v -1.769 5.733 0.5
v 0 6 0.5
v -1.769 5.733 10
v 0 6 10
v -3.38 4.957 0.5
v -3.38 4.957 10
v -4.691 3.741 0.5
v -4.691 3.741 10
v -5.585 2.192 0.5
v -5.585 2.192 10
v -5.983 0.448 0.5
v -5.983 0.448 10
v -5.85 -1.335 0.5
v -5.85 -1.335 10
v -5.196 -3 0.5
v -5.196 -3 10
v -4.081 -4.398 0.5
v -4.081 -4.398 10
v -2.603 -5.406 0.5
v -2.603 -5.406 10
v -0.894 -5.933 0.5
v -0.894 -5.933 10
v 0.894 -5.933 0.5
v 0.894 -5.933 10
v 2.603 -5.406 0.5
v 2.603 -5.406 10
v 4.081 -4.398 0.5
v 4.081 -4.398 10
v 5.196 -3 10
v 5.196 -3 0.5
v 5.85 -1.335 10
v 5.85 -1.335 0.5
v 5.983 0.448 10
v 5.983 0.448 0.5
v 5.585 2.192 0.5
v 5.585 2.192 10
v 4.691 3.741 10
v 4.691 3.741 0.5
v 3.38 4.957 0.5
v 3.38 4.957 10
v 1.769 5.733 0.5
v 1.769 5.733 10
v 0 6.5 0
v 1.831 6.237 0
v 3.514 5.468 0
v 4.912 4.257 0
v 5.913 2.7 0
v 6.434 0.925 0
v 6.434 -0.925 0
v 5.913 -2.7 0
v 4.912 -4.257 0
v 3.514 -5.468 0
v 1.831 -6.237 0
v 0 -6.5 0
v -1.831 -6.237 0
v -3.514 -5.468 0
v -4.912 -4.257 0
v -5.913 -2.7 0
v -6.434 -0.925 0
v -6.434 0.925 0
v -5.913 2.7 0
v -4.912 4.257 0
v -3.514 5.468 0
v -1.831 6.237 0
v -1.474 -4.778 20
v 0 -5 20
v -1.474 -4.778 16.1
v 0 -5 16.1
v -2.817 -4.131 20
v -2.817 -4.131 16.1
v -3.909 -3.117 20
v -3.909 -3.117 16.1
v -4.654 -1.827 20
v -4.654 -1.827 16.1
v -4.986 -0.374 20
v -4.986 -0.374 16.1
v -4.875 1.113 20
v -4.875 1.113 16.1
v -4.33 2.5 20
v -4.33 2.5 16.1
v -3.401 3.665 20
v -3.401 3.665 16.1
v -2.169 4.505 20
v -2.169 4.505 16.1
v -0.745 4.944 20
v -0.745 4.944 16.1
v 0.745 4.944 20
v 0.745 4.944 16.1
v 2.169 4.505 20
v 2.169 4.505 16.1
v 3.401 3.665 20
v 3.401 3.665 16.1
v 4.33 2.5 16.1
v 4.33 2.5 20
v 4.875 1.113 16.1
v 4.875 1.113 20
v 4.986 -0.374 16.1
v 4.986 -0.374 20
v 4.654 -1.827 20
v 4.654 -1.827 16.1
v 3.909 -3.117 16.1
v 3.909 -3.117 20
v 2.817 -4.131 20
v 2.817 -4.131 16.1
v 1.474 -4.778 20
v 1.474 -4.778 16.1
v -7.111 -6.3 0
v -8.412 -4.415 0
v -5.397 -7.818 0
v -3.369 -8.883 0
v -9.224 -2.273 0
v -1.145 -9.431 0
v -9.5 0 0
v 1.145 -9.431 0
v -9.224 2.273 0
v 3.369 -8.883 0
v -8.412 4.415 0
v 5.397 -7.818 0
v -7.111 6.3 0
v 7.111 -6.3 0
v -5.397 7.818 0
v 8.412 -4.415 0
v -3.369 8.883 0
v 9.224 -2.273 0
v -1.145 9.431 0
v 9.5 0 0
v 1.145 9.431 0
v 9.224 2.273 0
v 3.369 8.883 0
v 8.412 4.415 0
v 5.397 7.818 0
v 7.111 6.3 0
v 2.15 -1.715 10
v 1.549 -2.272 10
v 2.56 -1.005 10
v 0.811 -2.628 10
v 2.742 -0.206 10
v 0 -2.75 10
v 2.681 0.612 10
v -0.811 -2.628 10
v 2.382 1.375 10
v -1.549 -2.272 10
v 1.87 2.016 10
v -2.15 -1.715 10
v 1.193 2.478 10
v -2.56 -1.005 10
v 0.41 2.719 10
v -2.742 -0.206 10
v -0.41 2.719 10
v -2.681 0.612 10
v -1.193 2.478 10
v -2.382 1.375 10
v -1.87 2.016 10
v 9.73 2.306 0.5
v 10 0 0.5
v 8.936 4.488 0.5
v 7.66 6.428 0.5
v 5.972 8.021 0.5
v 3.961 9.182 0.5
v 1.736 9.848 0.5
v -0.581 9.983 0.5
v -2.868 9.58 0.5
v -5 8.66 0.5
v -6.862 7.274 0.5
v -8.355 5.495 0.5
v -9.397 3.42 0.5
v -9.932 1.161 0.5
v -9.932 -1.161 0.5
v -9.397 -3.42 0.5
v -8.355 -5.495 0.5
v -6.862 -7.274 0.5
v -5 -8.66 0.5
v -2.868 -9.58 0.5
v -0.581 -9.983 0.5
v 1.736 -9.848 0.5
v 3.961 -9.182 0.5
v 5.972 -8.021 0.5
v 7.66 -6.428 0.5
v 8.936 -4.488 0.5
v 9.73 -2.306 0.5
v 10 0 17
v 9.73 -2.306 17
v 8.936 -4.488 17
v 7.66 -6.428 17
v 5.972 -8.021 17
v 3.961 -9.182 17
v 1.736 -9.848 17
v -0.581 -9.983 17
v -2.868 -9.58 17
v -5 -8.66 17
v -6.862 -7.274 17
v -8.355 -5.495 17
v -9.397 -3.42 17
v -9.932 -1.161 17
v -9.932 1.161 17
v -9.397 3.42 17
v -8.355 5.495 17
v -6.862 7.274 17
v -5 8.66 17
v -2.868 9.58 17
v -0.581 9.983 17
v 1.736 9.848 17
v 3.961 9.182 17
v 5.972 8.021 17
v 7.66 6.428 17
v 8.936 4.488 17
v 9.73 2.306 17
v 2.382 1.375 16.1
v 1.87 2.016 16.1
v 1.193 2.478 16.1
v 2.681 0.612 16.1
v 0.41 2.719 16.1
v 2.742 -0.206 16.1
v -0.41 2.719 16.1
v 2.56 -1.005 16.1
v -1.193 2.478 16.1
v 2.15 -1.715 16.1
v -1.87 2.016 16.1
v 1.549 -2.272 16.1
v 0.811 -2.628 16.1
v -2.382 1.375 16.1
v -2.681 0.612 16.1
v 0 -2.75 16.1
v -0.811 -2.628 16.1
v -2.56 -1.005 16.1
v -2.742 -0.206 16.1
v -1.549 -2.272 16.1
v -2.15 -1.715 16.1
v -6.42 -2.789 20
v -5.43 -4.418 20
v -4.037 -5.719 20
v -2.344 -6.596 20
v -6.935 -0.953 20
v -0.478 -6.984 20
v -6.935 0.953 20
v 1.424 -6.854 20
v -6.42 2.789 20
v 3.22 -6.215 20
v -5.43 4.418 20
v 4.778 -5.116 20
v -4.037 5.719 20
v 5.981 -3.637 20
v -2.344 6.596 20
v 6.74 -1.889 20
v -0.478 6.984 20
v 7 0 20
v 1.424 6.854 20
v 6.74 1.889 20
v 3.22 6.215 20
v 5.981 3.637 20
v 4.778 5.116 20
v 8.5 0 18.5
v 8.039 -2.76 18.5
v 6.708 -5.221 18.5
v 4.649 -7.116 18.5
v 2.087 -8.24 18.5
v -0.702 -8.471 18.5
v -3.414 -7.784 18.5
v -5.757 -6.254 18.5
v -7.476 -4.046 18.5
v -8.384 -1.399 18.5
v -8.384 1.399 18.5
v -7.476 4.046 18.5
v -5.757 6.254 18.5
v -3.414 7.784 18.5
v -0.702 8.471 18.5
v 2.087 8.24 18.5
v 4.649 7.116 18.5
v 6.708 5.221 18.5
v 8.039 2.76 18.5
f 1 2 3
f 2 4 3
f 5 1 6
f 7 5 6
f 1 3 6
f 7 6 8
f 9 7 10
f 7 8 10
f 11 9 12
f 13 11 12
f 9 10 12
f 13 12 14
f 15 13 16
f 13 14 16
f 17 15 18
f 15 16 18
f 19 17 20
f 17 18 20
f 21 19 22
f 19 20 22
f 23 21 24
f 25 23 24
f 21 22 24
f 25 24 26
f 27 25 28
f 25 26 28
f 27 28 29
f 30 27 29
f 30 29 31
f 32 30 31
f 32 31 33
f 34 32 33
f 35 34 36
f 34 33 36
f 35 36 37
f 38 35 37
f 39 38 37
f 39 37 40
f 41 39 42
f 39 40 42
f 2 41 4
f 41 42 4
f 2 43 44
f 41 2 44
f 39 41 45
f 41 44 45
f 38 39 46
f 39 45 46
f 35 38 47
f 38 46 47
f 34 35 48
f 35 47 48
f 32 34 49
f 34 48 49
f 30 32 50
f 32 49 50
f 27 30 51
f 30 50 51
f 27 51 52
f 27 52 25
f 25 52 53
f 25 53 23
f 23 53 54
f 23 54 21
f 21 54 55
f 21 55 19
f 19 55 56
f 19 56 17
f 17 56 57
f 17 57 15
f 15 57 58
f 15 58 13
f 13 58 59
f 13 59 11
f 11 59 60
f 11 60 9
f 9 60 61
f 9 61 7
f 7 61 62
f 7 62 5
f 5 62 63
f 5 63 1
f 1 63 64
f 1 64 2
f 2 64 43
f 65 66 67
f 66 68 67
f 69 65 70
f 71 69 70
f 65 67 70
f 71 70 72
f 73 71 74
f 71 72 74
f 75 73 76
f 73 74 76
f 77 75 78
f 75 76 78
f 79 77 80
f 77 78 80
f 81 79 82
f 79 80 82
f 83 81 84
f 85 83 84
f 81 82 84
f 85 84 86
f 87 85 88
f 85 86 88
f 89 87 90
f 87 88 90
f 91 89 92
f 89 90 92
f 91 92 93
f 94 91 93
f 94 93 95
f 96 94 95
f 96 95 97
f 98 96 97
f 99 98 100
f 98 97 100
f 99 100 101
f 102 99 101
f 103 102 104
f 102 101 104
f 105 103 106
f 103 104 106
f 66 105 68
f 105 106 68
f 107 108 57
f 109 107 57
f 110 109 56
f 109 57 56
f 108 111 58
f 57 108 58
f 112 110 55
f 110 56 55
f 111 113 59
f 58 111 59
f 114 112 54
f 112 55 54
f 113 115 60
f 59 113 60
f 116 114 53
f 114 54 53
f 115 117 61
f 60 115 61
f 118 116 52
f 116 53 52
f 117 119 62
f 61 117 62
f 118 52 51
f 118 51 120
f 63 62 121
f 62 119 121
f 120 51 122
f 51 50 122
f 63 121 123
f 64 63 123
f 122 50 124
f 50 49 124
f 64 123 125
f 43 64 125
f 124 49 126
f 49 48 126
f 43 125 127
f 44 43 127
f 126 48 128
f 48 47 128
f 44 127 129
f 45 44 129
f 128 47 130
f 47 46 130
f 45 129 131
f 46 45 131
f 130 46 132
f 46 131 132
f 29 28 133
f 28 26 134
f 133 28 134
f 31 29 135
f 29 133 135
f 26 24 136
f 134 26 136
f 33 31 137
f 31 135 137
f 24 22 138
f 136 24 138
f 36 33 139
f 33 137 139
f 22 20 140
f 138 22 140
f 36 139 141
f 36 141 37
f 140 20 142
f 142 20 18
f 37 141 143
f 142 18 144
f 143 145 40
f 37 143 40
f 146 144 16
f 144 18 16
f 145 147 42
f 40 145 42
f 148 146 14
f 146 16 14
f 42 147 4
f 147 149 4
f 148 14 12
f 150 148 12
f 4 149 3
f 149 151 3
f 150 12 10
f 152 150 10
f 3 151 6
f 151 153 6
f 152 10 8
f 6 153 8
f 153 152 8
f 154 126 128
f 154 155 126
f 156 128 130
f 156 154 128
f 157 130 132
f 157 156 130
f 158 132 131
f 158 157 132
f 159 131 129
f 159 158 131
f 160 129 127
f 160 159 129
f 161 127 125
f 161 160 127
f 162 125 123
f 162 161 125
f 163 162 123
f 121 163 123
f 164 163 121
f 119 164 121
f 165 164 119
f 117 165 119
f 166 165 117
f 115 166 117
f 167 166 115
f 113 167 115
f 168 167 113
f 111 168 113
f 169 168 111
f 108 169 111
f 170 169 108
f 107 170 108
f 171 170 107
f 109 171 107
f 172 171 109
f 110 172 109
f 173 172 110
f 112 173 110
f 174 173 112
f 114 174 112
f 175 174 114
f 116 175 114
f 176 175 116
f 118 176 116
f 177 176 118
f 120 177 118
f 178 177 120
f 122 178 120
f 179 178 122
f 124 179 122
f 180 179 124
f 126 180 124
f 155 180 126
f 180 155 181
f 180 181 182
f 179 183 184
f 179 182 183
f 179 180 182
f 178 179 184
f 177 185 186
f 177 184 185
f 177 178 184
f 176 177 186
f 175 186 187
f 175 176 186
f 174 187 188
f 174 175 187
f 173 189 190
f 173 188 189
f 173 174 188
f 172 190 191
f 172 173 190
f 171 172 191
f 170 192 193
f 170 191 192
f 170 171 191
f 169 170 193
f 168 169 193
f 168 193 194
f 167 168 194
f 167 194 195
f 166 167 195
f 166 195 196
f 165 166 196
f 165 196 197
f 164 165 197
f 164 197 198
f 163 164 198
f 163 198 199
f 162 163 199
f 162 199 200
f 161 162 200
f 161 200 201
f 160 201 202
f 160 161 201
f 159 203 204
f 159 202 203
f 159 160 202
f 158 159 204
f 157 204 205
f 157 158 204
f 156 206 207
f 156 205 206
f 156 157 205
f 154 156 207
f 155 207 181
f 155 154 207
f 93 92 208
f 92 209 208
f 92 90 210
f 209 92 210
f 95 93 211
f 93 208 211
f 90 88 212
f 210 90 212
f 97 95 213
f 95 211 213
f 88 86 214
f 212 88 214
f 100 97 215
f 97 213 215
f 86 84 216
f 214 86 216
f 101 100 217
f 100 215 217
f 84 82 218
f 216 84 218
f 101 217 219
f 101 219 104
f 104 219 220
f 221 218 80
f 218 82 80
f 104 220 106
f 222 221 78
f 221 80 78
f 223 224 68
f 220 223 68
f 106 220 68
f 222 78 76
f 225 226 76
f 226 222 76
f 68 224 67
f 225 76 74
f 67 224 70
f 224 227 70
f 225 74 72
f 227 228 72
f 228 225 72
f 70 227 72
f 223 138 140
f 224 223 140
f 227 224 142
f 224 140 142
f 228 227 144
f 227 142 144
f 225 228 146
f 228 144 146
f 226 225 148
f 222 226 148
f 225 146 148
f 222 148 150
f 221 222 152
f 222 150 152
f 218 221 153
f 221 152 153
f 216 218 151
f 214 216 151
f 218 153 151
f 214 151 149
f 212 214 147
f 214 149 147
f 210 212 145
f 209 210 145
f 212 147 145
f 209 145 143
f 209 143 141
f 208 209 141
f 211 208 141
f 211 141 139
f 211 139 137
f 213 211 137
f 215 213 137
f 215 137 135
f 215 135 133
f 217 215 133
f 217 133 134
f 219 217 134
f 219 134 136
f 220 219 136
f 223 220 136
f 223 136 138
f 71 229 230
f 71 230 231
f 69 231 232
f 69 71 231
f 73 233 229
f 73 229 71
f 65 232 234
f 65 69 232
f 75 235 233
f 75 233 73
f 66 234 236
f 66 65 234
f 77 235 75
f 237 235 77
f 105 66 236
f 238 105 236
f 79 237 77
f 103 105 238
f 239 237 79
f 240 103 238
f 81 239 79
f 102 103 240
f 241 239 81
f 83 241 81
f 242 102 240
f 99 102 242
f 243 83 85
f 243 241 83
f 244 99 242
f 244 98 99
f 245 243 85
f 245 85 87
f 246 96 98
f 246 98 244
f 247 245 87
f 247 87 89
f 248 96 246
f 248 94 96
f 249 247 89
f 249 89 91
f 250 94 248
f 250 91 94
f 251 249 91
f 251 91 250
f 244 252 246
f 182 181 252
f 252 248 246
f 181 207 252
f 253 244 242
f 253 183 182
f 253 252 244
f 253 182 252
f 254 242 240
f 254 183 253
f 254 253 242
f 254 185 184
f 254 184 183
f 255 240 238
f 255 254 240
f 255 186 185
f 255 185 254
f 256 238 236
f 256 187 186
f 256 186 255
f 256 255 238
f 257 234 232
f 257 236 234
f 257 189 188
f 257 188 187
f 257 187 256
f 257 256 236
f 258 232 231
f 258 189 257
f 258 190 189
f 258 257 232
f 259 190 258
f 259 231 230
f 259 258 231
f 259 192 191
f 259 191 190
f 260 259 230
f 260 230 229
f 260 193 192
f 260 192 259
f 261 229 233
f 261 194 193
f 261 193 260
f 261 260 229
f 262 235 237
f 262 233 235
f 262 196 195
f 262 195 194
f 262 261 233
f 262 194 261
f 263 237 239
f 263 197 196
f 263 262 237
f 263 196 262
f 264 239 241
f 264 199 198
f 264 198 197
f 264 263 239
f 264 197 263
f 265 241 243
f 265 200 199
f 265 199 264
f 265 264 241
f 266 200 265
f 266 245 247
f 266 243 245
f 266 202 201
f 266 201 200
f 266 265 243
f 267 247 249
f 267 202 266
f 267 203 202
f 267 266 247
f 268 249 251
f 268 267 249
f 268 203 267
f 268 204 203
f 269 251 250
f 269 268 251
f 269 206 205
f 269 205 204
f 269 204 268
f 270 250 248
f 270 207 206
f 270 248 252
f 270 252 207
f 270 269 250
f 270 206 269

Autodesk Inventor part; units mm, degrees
ref_plane "YZ Plane" through (0, 0, 0) normal (1, 0, 0) x (0, 1, 0)
ref_plane "XZ Plane" through (0, 0, 0) normal (0, 1, 0) x (-1, 0, 0)
ref_plane "XY Plane" through (0, 0, 0) normal (0, 0, 1) x (1, 0, 0)
sketch "Skizze2" plane through (0, 0, 0) normal (0, 0, 1) x (1, 0, 0)
  line L0 (0, 14) -> (0, -14) construction
  line L1 (-14, 0) -> (14, 0) construction
  circle A0 centre (0, 0) radius 10
  dimension "d0" = 20
extrude "Grundkörper" add sketch "Skizze2" along normal blind 20
sketch "Skizze3" plane through (0, 0, 0) normal (0, 0, -1) x (-1, 0, 0)
  line L0 (0, -14) -> (0, 14) projected
  line L1 (-14, 0) -> (14, 0) projected
  point P0 (0, 0)
  point P1 (0, 0)
hole "12H7_Passbohrung" at (0, 0, 0) direction (0, 0, 1) diameter 12 depth 10
sketch "Skizze4" plane through (0, 0, 20) normal (0, 0, 1) x (1, 0, 0)
  line L0 (0, 14) -> (0, -14) construction
  line L1 (-14, 0) -> (14, 0) construction
  point P0 (0, 0)
  point P1 (0, 0)
hole "DIN7984_M5_Bohrung" at (0, 0, 20) direction (0, 0, -1) diameter 5.5 end through all counterbore diameter 10 counterbore depth 3.9
chamfer "Fase_Deckel" distance 3 angle 45 1 edges at (-10, 0, 20)
chamfer "Fase_Allgemein" distance 0.5 angle 45 2 edges at (0, -6, 0) (-10, 0, 0)
properties part number "200-60-DIFFERENTIAL-CONNECTOR-03" material "Edelstahl"
